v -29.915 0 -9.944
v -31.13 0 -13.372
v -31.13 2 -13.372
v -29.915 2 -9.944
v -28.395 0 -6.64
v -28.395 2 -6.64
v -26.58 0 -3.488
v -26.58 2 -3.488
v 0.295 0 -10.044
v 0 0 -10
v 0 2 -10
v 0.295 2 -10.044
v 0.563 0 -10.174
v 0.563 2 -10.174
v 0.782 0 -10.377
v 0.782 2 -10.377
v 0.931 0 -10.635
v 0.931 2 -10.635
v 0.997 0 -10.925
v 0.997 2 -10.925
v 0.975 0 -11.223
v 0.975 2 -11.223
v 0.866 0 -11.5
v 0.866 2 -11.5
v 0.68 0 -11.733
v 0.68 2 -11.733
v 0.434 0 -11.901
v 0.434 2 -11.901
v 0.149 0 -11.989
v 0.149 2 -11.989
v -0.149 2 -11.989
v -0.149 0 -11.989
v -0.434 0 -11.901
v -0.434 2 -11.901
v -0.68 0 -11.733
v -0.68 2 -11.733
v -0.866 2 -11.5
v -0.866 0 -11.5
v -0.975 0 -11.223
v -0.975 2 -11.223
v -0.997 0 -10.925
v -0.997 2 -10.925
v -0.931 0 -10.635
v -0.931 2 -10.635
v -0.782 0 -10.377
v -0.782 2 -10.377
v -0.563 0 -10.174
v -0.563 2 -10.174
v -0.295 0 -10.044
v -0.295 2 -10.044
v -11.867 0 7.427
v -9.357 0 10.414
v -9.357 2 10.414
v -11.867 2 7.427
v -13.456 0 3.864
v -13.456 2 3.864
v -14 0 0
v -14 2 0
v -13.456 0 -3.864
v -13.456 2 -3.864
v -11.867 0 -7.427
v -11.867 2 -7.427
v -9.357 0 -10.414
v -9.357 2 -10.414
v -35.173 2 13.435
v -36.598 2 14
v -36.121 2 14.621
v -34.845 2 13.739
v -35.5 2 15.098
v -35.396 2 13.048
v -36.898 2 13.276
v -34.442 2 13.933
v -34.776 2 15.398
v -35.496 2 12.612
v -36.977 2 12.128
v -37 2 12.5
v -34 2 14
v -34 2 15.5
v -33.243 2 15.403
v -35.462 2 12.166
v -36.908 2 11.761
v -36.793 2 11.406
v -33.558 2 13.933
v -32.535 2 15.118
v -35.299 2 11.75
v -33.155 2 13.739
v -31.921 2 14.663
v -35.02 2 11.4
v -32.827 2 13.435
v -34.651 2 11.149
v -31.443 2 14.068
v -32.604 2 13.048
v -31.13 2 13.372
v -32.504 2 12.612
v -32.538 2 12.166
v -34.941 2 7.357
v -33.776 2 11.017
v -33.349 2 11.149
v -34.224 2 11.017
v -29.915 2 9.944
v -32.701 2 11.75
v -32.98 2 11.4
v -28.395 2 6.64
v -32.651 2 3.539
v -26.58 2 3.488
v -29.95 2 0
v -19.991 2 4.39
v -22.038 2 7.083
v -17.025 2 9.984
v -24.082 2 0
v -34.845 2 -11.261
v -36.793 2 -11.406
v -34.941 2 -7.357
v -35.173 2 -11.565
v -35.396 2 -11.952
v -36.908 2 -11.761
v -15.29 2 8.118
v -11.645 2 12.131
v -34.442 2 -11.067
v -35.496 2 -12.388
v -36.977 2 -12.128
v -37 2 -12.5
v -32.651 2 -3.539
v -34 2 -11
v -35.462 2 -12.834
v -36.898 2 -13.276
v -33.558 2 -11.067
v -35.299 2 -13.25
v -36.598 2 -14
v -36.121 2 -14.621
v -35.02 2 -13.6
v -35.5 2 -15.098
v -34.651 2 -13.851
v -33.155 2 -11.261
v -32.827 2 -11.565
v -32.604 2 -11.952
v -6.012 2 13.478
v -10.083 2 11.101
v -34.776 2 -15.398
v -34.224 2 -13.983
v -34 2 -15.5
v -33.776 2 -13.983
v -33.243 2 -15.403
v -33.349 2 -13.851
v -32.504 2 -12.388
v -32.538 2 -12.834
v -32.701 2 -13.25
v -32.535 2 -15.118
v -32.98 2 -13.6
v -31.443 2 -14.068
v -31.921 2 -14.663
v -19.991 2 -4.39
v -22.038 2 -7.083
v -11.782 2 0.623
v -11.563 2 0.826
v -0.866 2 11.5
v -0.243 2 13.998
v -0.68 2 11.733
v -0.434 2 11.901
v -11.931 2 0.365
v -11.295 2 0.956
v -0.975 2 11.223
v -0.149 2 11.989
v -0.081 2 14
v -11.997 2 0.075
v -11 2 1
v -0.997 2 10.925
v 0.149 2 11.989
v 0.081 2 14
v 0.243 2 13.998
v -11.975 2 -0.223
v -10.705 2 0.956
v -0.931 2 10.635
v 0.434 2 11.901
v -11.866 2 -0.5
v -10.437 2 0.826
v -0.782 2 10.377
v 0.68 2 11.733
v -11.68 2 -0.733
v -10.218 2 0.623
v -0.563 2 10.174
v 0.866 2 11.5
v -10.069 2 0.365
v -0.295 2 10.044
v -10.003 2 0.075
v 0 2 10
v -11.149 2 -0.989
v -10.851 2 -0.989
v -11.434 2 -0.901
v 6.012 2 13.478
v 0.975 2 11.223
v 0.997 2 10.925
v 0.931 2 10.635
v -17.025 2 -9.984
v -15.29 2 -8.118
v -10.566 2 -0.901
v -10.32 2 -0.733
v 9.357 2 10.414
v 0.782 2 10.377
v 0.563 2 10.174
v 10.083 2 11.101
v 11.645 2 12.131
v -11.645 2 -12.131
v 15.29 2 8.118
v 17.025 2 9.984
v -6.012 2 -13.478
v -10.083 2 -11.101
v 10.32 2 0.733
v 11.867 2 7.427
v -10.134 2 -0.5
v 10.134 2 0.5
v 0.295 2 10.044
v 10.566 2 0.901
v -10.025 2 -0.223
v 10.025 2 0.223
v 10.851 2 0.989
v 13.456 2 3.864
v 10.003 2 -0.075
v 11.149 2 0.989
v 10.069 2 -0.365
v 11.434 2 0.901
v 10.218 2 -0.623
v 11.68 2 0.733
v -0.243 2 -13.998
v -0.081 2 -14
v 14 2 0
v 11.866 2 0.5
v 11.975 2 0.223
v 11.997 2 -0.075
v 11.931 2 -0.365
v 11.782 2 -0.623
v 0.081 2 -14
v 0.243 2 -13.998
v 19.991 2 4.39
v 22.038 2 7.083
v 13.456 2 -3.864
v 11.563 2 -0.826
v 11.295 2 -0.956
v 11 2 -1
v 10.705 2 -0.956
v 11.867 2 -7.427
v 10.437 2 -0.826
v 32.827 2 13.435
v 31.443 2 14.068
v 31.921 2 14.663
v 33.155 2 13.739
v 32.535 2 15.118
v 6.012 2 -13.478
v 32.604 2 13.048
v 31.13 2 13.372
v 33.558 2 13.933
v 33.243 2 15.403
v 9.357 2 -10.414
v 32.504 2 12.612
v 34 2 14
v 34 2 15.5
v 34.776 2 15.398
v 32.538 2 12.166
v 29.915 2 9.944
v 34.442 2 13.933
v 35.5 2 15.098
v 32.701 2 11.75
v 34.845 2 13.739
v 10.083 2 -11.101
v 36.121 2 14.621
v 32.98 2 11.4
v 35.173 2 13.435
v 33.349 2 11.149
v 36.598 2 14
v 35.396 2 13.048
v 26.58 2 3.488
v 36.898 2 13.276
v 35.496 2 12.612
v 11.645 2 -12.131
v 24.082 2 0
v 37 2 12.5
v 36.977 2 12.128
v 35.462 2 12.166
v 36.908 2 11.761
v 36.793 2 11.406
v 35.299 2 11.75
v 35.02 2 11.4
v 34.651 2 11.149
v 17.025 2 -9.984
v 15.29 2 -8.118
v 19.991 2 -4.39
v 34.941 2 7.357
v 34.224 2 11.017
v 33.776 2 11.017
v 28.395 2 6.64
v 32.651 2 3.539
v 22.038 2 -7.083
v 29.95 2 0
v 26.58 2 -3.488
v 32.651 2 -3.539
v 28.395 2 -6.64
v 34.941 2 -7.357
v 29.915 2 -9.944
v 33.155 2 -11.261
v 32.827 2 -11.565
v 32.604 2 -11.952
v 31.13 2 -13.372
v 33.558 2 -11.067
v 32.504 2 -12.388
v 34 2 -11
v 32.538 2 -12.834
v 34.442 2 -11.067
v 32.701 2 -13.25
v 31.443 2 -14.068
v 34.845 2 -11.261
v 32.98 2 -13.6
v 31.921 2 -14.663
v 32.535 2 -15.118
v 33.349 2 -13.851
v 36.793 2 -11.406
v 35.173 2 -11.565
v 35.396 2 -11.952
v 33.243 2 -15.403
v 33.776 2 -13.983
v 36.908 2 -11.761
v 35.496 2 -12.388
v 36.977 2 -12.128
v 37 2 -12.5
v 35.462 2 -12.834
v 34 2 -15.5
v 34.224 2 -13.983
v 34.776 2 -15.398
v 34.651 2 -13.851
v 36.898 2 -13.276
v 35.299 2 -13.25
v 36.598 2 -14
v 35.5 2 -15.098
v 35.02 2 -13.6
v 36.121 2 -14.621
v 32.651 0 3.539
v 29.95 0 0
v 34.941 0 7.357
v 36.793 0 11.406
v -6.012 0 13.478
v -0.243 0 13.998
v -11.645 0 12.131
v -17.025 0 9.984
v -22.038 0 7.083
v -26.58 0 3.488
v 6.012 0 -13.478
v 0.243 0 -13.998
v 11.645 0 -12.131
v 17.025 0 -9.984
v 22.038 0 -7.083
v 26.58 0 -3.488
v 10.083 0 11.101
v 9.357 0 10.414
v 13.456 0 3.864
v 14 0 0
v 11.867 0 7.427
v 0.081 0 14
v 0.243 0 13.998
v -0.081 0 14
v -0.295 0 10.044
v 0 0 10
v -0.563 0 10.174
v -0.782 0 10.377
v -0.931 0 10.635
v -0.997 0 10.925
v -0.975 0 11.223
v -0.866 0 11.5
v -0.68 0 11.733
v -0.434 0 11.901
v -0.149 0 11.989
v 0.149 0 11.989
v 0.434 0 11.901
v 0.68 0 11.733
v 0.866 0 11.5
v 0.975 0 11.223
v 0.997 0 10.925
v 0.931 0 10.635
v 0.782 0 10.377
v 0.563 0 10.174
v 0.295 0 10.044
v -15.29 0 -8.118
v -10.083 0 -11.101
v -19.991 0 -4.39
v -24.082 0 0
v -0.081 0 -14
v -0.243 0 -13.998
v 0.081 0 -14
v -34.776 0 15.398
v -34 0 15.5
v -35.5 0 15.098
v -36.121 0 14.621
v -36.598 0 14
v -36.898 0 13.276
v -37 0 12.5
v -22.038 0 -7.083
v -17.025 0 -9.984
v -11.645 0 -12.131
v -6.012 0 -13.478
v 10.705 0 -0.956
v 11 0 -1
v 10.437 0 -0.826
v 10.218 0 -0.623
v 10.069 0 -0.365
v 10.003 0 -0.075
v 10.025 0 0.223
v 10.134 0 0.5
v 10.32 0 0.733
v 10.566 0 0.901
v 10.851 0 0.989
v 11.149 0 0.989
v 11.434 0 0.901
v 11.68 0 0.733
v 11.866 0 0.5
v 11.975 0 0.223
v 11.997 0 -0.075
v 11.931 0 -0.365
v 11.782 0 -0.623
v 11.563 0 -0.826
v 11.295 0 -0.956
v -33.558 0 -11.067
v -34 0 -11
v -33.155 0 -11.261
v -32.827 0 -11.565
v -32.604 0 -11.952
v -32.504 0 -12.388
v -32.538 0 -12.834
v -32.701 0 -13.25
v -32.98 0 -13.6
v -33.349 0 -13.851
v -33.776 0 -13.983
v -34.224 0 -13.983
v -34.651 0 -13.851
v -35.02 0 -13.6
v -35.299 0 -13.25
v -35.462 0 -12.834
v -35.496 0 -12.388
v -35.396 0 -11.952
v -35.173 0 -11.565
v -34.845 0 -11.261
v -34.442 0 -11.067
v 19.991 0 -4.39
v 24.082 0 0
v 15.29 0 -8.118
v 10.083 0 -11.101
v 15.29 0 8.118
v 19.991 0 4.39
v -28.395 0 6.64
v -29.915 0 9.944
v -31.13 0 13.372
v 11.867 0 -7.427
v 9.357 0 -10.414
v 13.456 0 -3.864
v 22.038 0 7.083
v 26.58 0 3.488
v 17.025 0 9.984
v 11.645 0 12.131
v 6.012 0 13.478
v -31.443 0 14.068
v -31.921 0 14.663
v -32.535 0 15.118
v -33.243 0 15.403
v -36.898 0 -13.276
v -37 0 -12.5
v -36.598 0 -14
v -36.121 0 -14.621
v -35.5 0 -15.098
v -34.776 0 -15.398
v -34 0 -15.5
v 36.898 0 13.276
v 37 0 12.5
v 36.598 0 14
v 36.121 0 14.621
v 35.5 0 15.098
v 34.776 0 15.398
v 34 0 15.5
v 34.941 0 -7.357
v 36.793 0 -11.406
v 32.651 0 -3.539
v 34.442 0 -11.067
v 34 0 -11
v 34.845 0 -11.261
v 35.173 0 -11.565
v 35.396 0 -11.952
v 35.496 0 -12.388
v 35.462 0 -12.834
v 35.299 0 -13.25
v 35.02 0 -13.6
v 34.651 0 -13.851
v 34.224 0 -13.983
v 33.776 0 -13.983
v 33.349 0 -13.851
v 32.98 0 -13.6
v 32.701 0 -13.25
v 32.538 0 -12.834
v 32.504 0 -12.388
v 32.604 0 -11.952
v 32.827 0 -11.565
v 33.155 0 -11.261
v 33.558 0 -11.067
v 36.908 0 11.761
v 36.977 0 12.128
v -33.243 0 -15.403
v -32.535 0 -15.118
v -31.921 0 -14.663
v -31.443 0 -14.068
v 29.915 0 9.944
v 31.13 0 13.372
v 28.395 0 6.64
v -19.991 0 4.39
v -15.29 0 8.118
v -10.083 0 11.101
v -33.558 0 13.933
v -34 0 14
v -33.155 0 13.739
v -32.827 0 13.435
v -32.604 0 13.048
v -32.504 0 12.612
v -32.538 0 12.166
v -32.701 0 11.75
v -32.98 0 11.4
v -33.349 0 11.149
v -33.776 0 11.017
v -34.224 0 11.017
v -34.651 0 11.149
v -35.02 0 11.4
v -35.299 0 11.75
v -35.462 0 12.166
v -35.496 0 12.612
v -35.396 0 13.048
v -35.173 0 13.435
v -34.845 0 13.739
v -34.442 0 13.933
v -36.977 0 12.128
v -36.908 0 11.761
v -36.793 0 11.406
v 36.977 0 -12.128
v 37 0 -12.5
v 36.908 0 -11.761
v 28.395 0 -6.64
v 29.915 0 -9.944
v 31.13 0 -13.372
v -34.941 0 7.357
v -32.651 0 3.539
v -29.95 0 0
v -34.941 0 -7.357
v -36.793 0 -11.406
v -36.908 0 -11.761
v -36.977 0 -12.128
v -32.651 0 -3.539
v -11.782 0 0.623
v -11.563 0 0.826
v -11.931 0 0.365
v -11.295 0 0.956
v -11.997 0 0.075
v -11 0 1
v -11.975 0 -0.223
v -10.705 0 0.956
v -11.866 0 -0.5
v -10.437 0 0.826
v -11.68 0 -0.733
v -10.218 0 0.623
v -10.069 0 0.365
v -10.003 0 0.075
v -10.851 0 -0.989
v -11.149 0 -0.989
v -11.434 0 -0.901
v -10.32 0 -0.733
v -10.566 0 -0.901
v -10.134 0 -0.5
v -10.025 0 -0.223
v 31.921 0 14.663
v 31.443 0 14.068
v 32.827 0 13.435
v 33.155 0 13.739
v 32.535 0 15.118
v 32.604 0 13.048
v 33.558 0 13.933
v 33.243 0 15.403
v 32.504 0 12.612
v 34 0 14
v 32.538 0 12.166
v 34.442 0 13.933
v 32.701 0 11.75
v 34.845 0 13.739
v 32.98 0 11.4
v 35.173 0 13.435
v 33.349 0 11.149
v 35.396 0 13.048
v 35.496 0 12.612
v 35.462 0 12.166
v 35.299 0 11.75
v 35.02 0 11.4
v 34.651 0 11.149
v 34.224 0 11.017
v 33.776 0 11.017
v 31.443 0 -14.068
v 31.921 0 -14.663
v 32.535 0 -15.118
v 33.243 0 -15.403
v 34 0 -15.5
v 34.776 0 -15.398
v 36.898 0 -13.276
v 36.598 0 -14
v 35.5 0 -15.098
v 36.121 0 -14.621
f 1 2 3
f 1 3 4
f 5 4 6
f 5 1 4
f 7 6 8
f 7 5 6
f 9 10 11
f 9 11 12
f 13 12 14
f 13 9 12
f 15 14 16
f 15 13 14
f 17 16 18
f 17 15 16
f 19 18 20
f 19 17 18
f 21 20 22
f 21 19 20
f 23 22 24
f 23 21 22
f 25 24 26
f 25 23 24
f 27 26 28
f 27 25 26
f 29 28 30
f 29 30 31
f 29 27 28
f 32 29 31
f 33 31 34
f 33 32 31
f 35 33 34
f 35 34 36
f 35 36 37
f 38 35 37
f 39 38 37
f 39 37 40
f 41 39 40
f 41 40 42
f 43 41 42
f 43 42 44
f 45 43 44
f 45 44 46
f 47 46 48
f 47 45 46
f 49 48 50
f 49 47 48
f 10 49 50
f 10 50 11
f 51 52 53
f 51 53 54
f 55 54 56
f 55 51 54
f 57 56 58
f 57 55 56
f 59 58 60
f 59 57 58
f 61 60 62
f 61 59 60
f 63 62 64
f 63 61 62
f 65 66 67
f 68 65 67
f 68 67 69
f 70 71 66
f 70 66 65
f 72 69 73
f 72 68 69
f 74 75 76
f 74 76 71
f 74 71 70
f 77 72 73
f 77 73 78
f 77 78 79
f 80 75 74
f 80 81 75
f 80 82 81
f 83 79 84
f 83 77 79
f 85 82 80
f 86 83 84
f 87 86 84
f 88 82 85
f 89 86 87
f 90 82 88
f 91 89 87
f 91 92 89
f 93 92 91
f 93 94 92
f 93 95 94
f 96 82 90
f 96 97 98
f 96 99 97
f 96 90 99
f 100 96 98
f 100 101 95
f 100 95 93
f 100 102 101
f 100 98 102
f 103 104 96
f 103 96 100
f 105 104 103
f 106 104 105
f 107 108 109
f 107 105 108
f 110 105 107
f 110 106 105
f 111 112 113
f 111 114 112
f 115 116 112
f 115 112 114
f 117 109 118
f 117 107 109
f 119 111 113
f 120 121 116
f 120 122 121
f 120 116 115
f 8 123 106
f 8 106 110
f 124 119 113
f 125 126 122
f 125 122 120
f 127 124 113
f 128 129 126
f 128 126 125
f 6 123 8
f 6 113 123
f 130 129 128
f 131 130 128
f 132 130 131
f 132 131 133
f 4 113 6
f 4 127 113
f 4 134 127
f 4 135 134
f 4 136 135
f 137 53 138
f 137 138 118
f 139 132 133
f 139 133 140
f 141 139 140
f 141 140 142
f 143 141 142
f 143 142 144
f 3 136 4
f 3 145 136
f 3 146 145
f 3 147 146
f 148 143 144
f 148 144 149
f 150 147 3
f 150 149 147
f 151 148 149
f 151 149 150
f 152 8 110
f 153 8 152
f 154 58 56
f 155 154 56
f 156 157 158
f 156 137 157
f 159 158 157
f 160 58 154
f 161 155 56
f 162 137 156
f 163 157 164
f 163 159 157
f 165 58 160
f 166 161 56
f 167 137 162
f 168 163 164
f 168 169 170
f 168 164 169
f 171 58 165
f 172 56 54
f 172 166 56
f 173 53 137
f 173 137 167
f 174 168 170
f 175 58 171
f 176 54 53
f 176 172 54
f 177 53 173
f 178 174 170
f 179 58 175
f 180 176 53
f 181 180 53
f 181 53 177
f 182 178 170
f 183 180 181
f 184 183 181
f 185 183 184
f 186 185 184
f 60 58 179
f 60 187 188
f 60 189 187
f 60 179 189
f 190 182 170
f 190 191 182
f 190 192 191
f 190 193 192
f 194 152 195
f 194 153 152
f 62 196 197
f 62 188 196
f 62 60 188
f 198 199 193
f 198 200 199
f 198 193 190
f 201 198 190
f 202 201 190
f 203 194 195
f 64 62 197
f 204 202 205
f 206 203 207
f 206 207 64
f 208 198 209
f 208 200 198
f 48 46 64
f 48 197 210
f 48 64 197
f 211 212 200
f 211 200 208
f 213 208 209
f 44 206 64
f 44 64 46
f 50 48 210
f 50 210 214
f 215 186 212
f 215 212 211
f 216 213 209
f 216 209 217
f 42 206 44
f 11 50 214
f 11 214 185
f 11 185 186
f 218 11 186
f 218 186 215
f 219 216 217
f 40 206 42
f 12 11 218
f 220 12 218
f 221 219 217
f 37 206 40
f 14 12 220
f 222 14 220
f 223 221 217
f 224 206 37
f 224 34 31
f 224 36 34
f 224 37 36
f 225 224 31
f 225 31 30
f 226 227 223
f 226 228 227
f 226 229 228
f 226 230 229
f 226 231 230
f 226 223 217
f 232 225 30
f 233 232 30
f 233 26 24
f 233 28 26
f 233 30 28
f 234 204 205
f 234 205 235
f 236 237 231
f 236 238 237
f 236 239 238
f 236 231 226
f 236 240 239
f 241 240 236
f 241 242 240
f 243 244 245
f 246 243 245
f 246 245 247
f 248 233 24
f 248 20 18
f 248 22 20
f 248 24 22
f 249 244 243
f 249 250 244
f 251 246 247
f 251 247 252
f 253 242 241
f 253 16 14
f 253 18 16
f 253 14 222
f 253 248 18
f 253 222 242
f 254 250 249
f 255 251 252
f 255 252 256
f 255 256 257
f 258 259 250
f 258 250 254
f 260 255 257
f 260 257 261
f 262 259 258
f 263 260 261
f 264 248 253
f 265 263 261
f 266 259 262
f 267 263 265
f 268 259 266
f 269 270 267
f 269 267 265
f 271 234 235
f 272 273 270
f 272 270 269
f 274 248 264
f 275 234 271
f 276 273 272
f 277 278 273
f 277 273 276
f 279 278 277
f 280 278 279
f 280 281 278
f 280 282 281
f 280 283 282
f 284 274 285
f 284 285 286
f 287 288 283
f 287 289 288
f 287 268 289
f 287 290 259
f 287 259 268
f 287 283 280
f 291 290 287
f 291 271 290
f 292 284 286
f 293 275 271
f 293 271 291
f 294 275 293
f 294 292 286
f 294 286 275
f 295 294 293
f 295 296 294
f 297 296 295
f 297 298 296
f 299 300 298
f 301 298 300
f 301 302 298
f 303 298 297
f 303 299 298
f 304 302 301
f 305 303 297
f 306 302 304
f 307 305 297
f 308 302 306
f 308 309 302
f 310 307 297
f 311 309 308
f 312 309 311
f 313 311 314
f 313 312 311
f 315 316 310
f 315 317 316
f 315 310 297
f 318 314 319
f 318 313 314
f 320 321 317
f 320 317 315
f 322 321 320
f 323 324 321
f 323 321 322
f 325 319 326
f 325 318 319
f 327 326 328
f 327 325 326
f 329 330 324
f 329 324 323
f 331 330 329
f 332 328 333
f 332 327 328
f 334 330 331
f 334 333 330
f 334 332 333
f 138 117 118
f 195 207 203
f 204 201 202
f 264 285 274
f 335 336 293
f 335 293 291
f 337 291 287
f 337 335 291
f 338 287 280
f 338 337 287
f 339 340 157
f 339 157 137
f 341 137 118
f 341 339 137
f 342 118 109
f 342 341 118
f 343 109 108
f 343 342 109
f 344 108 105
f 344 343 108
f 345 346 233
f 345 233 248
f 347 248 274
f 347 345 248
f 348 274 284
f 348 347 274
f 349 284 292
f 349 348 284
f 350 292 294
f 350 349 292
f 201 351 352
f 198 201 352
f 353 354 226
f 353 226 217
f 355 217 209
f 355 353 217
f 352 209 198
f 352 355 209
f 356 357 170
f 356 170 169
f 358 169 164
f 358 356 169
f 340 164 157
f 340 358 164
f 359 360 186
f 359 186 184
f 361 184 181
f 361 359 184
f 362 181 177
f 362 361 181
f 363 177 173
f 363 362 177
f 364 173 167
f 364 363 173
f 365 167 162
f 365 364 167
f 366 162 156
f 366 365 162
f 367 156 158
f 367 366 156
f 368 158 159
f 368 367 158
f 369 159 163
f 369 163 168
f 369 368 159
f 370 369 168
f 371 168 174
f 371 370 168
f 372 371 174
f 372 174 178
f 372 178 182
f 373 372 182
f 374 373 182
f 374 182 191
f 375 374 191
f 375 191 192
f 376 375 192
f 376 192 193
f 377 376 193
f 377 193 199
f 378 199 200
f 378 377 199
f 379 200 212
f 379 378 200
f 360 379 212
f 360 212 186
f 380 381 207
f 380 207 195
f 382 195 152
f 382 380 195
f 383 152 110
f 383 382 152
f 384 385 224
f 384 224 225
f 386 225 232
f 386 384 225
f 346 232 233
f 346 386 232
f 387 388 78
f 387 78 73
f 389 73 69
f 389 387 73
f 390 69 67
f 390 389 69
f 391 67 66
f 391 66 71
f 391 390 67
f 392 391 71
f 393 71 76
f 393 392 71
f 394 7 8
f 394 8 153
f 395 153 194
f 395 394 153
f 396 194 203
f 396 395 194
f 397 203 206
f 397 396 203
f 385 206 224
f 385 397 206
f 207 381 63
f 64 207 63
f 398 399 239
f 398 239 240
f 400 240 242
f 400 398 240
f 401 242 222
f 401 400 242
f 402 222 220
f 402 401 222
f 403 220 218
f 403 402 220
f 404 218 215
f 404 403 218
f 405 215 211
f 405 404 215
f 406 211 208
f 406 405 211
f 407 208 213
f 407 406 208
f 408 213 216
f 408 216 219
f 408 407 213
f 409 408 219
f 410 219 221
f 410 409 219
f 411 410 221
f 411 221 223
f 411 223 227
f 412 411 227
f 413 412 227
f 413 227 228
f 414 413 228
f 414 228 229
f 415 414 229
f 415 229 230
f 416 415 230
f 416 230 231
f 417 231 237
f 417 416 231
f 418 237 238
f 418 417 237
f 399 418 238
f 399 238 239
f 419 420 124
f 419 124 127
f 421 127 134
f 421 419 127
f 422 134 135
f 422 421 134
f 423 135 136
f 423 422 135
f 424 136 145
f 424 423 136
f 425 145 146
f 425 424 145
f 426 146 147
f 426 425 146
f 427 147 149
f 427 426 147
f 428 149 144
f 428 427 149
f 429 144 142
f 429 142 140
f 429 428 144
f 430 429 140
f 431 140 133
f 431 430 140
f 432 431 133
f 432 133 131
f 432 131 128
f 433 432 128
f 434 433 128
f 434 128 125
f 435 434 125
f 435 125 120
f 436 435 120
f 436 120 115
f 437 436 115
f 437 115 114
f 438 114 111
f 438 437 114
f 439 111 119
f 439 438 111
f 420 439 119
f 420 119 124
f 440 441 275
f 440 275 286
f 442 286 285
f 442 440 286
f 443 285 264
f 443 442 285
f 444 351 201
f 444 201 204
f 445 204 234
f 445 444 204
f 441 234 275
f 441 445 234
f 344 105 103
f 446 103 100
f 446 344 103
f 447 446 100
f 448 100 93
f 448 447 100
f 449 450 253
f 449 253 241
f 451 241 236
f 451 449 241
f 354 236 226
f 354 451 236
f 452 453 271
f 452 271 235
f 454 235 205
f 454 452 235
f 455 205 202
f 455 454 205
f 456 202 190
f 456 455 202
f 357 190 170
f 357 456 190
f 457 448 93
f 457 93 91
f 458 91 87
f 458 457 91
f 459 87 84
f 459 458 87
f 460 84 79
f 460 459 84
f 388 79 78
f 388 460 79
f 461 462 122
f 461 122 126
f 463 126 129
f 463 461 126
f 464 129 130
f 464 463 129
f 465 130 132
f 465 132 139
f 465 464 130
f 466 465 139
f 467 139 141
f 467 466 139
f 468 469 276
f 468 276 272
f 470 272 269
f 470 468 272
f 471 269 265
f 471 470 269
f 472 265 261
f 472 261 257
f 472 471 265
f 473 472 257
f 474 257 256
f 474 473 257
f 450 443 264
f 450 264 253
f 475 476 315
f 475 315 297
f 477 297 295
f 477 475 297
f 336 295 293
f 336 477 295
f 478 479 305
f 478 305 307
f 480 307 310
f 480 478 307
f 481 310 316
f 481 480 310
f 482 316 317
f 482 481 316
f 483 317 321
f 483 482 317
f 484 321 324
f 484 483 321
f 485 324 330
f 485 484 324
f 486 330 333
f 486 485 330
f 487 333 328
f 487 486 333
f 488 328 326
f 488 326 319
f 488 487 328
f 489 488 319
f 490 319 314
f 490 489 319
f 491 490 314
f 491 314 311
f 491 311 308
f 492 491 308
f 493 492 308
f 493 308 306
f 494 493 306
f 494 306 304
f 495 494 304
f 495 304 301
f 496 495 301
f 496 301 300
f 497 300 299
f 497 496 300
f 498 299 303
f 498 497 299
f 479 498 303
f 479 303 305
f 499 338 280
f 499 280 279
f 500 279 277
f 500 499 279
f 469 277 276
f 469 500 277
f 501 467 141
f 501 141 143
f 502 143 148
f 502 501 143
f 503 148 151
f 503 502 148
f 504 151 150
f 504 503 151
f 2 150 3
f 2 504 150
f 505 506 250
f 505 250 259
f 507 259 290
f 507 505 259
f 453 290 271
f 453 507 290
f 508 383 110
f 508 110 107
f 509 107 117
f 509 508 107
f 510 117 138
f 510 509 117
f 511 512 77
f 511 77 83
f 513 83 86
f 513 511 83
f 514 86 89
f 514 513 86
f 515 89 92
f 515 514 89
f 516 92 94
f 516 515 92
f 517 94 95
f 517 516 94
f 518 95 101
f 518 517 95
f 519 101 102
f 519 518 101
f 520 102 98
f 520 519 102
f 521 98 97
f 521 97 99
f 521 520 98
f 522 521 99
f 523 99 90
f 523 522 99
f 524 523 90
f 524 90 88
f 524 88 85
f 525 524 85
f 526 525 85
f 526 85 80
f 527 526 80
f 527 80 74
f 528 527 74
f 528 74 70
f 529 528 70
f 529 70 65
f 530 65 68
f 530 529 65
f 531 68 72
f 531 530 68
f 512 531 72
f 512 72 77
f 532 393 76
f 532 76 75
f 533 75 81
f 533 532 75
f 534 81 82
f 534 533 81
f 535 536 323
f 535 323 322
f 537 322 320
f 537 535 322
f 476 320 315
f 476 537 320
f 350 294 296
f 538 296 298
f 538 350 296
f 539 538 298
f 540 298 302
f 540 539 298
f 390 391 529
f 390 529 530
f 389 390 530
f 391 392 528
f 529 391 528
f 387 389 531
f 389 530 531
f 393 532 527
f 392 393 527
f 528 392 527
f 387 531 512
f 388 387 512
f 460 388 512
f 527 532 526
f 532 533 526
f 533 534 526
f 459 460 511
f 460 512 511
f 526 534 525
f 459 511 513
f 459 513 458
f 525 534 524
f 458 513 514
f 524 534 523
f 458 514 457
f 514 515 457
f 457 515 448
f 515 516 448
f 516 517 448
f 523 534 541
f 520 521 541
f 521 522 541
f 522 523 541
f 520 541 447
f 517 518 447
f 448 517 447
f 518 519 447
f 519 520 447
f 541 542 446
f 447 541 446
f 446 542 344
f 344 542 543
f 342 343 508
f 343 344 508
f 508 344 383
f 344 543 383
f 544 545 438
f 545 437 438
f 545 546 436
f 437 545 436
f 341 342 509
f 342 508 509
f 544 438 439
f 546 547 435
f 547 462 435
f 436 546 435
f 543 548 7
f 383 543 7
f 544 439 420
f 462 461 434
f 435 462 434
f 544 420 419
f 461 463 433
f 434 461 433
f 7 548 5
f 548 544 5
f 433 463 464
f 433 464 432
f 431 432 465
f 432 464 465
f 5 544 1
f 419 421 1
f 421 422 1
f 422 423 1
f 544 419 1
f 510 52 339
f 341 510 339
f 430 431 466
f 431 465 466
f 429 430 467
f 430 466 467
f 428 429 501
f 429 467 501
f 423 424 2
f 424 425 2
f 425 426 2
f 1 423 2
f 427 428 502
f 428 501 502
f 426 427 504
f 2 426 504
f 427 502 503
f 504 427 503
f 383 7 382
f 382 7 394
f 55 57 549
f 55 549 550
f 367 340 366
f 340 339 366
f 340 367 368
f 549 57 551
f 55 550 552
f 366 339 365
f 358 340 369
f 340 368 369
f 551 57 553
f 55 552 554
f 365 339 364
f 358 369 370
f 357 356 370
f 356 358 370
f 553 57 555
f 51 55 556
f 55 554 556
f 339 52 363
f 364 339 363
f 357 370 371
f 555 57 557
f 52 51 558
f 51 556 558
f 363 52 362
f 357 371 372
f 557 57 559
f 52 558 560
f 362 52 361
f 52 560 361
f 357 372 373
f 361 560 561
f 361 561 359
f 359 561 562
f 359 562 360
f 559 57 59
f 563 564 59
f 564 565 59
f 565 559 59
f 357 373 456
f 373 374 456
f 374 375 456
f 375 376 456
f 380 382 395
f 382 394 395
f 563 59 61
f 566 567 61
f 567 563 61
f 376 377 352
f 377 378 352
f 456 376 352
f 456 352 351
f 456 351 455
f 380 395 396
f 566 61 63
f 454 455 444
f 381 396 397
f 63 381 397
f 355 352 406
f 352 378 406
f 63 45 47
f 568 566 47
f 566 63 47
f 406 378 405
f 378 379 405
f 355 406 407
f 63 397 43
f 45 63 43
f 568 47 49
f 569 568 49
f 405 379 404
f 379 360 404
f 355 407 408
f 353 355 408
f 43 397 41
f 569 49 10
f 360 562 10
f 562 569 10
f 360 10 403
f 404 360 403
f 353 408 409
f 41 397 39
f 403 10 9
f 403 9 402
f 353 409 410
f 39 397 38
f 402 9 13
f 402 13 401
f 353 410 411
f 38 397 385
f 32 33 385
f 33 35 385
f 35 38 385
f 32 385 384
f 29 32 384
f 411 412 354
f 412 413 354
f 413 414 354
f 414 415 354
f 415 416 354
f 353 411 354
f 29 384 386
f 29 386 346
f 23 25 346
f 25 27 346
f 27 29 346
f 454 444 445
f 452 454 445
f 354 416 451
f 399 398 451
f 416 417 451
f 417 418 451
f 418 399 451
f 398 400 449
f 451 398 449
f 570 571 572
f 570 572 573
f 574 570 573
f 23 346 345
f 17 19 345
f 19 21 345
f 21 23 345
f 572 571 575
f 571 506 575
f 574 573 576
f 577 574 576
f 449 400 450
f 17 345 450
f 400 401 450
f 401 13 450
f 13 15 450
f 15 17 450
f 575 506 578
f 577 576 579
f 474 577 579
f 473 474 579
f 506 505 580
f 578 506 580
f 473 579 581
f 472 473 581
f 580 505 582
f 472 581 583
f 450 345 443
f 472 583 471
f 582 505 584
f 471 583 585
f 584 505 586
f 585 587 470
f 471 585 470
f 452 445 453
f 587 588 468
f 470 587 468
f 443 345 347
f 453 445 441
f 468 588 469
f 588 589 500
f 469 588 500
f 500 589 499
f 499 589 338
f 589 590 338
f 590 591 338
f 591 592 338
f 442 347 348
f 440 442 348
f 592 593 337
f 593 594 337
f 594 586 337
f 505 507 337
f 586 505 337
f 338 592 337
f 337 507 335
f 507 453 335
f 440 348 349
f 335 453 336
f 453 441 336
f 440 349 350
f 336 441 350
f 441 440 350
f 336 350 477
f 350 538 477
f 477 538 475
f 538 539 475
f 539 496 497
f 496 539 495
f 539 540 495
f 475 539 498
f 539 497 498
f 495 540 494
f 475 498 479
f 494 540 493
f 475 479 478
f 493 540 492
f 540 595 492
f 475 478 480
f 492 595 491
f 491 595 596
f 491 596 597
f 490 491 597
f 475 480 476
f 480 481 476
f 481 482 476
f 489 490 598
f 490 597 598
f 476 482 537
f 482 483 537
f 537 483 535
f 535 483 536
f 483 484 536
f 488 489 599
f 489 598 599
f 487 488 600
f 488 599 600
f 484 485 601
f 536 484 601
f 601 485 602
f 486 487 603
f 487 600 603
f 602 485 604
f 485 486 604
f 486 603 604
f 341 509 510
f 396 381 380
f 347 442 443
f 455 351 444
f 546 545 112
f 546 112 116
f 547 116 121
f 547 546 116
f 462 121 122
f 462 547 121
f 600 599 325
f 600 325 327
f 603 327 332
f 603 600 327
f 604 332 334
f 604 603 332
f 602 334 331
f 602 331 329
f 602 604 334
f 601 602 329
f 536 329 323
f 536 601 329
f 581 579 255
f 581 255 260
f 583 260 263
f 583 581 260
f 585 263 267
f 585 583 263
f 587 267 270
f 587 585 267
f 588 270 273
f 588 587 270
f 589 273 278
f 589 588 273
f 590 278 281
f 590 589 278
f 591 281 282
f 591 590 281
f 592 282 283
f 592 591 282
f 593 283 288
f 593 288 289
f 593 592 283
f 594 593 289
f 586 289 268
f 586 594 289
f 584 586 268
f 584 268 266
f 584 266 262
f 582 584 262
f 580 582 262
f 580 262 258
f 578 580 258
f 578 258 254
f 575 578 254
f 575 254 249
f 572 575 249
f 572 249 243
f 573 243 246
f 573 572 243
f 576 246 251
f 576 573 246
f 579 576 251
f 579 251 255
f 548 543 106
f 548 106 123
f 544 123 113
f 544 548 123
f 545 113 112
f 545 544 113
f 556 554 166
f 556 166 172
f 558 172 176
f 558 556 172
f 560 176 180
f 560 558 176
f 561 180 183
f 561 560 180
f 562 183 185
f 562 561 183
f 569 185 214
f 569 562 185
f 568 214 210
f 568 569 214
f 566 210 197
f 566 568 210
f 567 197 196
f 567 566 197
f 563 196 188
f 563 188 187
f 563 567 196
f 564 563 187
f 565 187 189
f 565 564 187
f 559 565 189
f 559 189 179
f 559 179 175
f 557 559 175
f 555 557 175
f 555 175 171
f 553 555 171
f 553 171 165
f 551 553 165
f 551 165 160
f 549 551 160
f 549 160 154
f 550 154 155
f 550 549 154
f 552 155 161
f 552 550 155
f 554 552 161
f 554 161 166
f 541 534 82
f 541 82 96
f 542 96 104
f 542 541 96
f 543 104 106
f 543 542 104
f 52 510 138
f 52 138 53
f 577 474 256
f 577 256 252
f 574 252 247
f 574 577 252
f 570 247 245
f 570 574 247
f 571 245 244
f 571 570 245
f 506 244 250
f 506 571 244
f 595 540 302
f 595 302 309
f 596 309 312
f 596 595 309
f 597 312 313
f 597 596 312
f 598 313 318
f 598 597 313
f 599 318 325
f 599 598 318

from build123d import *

# Parameters (mm, degrees)
SKETCH_1_R          = 1.5
SKETCH_1_R_2        = 1
EXTRUDE_1_DEPTH     = 2
CUT_EXTRUDE_START   = -10
CUT_EXTRUDE_1_DEPTH = 10
EXTRUDE_START       = -2
EXTRUDE_2_DEPTH     = 2


with BuildPart() as part:
    # 草图1 → 凸台-拉伸1 (new body)
    with BuildSketch(Plane(origin=(0, 0, 0), x_dir=(1, 0, 0), z_dir=(0, 1, 0))):
        with BuildLine():
            Line((-35, 15.5), (35, 15.5))
            ThreePointArc((35, 15.5), (36.414213562, 14.914213562), (37, 13.5))
            Line((37, 13.5), (37, -13.5))
            ThreePointArc((37, -13.5), (36.414213562, -14.914213562), (35, -15.5))
            Line((35, -15.5), (-35, -15.5))
            ThreePointArc((-35, -15.5), (-36.414213562, -14.914213562), (-37, -13.5))
            Line((-37, -13.5), (-37, 13.5))
            ThreePointArc((-37, 13.5), (-36.414213562, 14.914213562), (-35, 15.5))
        make_face()
        with Locations((-34, 12.5)):
            Circle(SKETCH_1_R, mode=Mode.SUBTRACT)
        with Locations((-34, -12.5)):
            Circle(SKETCH_1_R, mode=Mode.SUBTRACT)
        with Locations((34, 12.5)):
            Circle(SKETCH_1_R, mode=Mode.SUBTRACT)
        with Locations((34, -12.5)):
            Circle(SKETCH_1_R, mode=Mode.SUBTRACT)
        with Locations((0, 11)):
            Circle(SKETCH_1_R_2, mode=Mode.SUBTRACT)
        with Locations((-11, 0)):
            Circle(SKETCH_1_R_2, mode=Mode.SUBTRACT)
        with Locations((0, -11)):
            Circle(SKETCH_1_R_2, mode=Mode.SUBTRACT)
        with Locations((11, 0)):
            Circle(SKETCH_1_R_2, mode=Mode.SUBTRACT)
    extrude(amount=EXTRUDE_1_DEPTH)

    # 草图2 → 切除-拉伸1 (cut)
    with BuildSketch(Plane(origin=(0, 2, 0), x_dir=(1, 0, 0), z_dir=(0, 1, 0)).offset(CUT_EXTRUDE_START)):
        with BuildLine():
            ThreePointArc((37, 13.5), (36.414213562, 14.914213562), (35, 15.5))
            Line((35, 15.5), (34, 15.5))
            ThreePointArc((34, 15.5), (36.121320344, 14.621320344), (37, 12.5))
            Line((37, 12.5), (37, 13.5))
        make_face()
        with BuildLine():
            ThreePointArc((31.129544421, 13.372057779), (32.21340734, 14.909997234), (34, 15.5))
            Line((34, 15.5), (-34.000000062, 15.5))
            ThreePointArc((-34.000000062, 15.5), (-32.213407365, 14.909997253), (-31.129544421, 13.372057779))
            ThreePointArc((-31.129544421, 13.372057779), (-29.192502027, 8.274752588), (-26.580191252, 3.488262657))
            ThreePointArc((-26.580191252, 3.488262657), (-14.374020851, 11.15529545), (-0.242721863, 13.997895774))
            ThreePointArc((-0.242721863, 13.997895774), (0, 14), (0.242721863, 13.997895774))
            ThreePointArc((0.242721863, 13.997895774), (14.374020851, 11.15529545), (26.580191252, 3.488262657))
            ThreePointArc((26.580191252, 3.488262657), (29.192502027, 8.274752588), (31.129544421, 13.372057779))
        make_face()
        with BuildLine():
            ThreePointArc((-37, 12.5), (-36.121320365, 14.621320322), (-34.000000062, 15.5))
            Line((-34.000000062, 15.5), (-35, 15.5))
            ThreePointArc((-35, 15.5), (-36.414213562, 14.914213562), (-37, 13.5))
            Line((-37, 13.5), (-37, 12.5))
        make_face()
        with BuildLine():
            Line((37, -12.5), (37, 12.5))
            ThreePointArc((37, 12.5), (36.947873541, 11.943186219), (36.793305609, 11.405722258))
            ThreePointArc((36.793305609, 11.405722258), (33.849039363, 5.416414449), (29.949941227, 0))
            ThreePointArc((29.949941227, 0), (33.849039363, -5.416414449), (36.793305609, -11.405722258))
            ThreePointArc((36.793305609, -11.405722258), (36.947873541, -11.943186219), (37, -12.5))
        make_face()
        with BuildLine():
            ThreePointArc((-36.793305609, 11.405722258), (-36.947873541, 11.943186219), (-37, 12.5))
            Line((-37, 12.5), (-37, -12.5))
            ThreePointArc((-37, -12.5), (-36.947873541, -11.943186219), (-36.793305609, -11.405722258))
            ThreePointArc((-36.793305609, -11.405722258), (-33.849039363, -5.416414449), (-29.949941227, 0))
            ThreePointArc((-29.949941227, 0), (-33.849039363, 5.416414449), (-36.793305609, 11.405722258))
        make_face()
        with BuildLine():
            Line((37, -13.5), (37, -12.5))
            ThreePointArc((37, -12.5), (36.121320344, -14.621320344), (34, -15.5))
            Line((34, -15.5), (35, -15.5))
            ThreePointArc((35, -15.5), (36.414213562, -14.914213562), (37, -13.5))
        make_face()
        with BuildLine():
            ThreePointArc((-34, -15.5), (-36.121320344, -14.621320344), (-37, -12.5))
            Line((-37, -12.5), (-37, -13.5))
            ThreePointArc((-37, -13.5), (-36.414213562, -14.914213562), (-35, -15.5))
            Line((-35, -15.5), (-34, -15.5))
        make_face()
        with BuildLine():
            Line((-34, -15.5), (34, -15.5))
            ThreePointArc((34, -15.5), (32.21340734, -14.909997234), (31.129544421, -13.372057779))
            ThreePointArc((31.129544421, -13.372057779), (29.192502027, -8.274752588), (26.580191252, -3.488262657))
            ThreePointArc((26.580191252, -3.488262657), (14.374020851, -11.15529545), (0.242721863, -13.997895774))
            ThreePointArc((0.242721863, -13.997895774), (0, -14), (-0.242721863, -13.997895774))
            ThreePointArc((-0.242721863, -13.997895774), (-14.374020851, -11.15529545), (-26.580191252, -3.488262657))
            ThreePointArc((-26.580191252, -3.488262657), (-29.192502027, -8.274752588), (-31.129544421, -13.372057779))
            ThreePointArc((-31.129544421, -13.372057779), (-32.21340734, -14.909997234), (-34, -15.5))
        make_face()
        with BuildLine():
            ThreePointArc((24.082197813, 0), (15.011406824, 8.30476234), (3.846336647, 13.461266449))
            ThreePointArc((3.846336647, 13.461266449), (14, 0), (3.846336647, -13.461266449))
            ThreePointArc((3.846336647, -13.461266449), (15.011406824, -8.30476234), (24.082197813, 0))
        make_face()
        with BuildLine():
            ThreePointArc((-3.846336647, -13.461266449), (-14, 0), (-3.846336647, 13.461266449))
            ThreePointArc((-3.846336647, 13.461266449), (-15.011406824, 8.30476234), (-24.082197813, 0))
            ThreePointArc((-24.082197813, 0), (-15.011406824, -8.30476234), (-3.846336647, -13.461266449))
        make_face()
    extrude(amount=CUT_EXTRUDE_1_DEPTH, mode=Mode.SUBTRACT)

    # 草图3 → 凸台-拉伸2 (add)
    with BuildSketch(Plane(origin=(0, 2, 0), x_dir=(1, 0, 0), z_dir=(0, 1, 0)).offset(EXTRUDE_START)):
        with BuildLine():
            Line((-10.083439521, 11.100962324), (-9.356776872, 10.413967859))
            ThreePointArc((-9.356776872, 10.413967859), (-6.775105817, 12.251446493), (-3.846336647, 13.461266449))
            ThreePointArc((-3.846336647, 13.461266449), (-7.014162346, 12.411321608), (-10.083439521, 11.100962324))
        make_face()
        with BuildLine():
            Line((10.083439521, 11.100962324), (9.356776872, 10.413967859))
            ThreePointArc((9.356776872, 10.413967859), (6.775105817, 12.251446493), (3.846336647, 13.461266449))
            ThreePointArc((3.846336647, 13.461266449), (7.014162346, 12.411321608), (10.083439521, 11.100962324))
        make_face()
        with BuildLine():
            Line((-10.083439521, -11.100962324), (-9.356776872, -10.413967859))
            ThreePointArc((-9.356776872, -10.413967859), (-6.775105817, -12.251446493), (-3.846336647, -13.461266449))
            ThreePointArc((-3.846336647, -13.461266449), (-7.014162346, -12.411321608), (-10.083439521, -11.100962324))
        make_face()
        with BuildLine():
            Line((10.083439521, -11.100962324), (9.356776872, -10.413967859))
            ThreePointArc((9.356776872, -10.413967859), (6.775105817, -12.251446493), (3.846336647, -13.461266449))
            ThreePointArc((3.846336647, -13.461266449), (7.014162346, -12.411321608), (10.083439521, -11.100962324))
        make_face()
    extrude(amount=EXTRUDE_2_DEPTH)


solid = part.part
